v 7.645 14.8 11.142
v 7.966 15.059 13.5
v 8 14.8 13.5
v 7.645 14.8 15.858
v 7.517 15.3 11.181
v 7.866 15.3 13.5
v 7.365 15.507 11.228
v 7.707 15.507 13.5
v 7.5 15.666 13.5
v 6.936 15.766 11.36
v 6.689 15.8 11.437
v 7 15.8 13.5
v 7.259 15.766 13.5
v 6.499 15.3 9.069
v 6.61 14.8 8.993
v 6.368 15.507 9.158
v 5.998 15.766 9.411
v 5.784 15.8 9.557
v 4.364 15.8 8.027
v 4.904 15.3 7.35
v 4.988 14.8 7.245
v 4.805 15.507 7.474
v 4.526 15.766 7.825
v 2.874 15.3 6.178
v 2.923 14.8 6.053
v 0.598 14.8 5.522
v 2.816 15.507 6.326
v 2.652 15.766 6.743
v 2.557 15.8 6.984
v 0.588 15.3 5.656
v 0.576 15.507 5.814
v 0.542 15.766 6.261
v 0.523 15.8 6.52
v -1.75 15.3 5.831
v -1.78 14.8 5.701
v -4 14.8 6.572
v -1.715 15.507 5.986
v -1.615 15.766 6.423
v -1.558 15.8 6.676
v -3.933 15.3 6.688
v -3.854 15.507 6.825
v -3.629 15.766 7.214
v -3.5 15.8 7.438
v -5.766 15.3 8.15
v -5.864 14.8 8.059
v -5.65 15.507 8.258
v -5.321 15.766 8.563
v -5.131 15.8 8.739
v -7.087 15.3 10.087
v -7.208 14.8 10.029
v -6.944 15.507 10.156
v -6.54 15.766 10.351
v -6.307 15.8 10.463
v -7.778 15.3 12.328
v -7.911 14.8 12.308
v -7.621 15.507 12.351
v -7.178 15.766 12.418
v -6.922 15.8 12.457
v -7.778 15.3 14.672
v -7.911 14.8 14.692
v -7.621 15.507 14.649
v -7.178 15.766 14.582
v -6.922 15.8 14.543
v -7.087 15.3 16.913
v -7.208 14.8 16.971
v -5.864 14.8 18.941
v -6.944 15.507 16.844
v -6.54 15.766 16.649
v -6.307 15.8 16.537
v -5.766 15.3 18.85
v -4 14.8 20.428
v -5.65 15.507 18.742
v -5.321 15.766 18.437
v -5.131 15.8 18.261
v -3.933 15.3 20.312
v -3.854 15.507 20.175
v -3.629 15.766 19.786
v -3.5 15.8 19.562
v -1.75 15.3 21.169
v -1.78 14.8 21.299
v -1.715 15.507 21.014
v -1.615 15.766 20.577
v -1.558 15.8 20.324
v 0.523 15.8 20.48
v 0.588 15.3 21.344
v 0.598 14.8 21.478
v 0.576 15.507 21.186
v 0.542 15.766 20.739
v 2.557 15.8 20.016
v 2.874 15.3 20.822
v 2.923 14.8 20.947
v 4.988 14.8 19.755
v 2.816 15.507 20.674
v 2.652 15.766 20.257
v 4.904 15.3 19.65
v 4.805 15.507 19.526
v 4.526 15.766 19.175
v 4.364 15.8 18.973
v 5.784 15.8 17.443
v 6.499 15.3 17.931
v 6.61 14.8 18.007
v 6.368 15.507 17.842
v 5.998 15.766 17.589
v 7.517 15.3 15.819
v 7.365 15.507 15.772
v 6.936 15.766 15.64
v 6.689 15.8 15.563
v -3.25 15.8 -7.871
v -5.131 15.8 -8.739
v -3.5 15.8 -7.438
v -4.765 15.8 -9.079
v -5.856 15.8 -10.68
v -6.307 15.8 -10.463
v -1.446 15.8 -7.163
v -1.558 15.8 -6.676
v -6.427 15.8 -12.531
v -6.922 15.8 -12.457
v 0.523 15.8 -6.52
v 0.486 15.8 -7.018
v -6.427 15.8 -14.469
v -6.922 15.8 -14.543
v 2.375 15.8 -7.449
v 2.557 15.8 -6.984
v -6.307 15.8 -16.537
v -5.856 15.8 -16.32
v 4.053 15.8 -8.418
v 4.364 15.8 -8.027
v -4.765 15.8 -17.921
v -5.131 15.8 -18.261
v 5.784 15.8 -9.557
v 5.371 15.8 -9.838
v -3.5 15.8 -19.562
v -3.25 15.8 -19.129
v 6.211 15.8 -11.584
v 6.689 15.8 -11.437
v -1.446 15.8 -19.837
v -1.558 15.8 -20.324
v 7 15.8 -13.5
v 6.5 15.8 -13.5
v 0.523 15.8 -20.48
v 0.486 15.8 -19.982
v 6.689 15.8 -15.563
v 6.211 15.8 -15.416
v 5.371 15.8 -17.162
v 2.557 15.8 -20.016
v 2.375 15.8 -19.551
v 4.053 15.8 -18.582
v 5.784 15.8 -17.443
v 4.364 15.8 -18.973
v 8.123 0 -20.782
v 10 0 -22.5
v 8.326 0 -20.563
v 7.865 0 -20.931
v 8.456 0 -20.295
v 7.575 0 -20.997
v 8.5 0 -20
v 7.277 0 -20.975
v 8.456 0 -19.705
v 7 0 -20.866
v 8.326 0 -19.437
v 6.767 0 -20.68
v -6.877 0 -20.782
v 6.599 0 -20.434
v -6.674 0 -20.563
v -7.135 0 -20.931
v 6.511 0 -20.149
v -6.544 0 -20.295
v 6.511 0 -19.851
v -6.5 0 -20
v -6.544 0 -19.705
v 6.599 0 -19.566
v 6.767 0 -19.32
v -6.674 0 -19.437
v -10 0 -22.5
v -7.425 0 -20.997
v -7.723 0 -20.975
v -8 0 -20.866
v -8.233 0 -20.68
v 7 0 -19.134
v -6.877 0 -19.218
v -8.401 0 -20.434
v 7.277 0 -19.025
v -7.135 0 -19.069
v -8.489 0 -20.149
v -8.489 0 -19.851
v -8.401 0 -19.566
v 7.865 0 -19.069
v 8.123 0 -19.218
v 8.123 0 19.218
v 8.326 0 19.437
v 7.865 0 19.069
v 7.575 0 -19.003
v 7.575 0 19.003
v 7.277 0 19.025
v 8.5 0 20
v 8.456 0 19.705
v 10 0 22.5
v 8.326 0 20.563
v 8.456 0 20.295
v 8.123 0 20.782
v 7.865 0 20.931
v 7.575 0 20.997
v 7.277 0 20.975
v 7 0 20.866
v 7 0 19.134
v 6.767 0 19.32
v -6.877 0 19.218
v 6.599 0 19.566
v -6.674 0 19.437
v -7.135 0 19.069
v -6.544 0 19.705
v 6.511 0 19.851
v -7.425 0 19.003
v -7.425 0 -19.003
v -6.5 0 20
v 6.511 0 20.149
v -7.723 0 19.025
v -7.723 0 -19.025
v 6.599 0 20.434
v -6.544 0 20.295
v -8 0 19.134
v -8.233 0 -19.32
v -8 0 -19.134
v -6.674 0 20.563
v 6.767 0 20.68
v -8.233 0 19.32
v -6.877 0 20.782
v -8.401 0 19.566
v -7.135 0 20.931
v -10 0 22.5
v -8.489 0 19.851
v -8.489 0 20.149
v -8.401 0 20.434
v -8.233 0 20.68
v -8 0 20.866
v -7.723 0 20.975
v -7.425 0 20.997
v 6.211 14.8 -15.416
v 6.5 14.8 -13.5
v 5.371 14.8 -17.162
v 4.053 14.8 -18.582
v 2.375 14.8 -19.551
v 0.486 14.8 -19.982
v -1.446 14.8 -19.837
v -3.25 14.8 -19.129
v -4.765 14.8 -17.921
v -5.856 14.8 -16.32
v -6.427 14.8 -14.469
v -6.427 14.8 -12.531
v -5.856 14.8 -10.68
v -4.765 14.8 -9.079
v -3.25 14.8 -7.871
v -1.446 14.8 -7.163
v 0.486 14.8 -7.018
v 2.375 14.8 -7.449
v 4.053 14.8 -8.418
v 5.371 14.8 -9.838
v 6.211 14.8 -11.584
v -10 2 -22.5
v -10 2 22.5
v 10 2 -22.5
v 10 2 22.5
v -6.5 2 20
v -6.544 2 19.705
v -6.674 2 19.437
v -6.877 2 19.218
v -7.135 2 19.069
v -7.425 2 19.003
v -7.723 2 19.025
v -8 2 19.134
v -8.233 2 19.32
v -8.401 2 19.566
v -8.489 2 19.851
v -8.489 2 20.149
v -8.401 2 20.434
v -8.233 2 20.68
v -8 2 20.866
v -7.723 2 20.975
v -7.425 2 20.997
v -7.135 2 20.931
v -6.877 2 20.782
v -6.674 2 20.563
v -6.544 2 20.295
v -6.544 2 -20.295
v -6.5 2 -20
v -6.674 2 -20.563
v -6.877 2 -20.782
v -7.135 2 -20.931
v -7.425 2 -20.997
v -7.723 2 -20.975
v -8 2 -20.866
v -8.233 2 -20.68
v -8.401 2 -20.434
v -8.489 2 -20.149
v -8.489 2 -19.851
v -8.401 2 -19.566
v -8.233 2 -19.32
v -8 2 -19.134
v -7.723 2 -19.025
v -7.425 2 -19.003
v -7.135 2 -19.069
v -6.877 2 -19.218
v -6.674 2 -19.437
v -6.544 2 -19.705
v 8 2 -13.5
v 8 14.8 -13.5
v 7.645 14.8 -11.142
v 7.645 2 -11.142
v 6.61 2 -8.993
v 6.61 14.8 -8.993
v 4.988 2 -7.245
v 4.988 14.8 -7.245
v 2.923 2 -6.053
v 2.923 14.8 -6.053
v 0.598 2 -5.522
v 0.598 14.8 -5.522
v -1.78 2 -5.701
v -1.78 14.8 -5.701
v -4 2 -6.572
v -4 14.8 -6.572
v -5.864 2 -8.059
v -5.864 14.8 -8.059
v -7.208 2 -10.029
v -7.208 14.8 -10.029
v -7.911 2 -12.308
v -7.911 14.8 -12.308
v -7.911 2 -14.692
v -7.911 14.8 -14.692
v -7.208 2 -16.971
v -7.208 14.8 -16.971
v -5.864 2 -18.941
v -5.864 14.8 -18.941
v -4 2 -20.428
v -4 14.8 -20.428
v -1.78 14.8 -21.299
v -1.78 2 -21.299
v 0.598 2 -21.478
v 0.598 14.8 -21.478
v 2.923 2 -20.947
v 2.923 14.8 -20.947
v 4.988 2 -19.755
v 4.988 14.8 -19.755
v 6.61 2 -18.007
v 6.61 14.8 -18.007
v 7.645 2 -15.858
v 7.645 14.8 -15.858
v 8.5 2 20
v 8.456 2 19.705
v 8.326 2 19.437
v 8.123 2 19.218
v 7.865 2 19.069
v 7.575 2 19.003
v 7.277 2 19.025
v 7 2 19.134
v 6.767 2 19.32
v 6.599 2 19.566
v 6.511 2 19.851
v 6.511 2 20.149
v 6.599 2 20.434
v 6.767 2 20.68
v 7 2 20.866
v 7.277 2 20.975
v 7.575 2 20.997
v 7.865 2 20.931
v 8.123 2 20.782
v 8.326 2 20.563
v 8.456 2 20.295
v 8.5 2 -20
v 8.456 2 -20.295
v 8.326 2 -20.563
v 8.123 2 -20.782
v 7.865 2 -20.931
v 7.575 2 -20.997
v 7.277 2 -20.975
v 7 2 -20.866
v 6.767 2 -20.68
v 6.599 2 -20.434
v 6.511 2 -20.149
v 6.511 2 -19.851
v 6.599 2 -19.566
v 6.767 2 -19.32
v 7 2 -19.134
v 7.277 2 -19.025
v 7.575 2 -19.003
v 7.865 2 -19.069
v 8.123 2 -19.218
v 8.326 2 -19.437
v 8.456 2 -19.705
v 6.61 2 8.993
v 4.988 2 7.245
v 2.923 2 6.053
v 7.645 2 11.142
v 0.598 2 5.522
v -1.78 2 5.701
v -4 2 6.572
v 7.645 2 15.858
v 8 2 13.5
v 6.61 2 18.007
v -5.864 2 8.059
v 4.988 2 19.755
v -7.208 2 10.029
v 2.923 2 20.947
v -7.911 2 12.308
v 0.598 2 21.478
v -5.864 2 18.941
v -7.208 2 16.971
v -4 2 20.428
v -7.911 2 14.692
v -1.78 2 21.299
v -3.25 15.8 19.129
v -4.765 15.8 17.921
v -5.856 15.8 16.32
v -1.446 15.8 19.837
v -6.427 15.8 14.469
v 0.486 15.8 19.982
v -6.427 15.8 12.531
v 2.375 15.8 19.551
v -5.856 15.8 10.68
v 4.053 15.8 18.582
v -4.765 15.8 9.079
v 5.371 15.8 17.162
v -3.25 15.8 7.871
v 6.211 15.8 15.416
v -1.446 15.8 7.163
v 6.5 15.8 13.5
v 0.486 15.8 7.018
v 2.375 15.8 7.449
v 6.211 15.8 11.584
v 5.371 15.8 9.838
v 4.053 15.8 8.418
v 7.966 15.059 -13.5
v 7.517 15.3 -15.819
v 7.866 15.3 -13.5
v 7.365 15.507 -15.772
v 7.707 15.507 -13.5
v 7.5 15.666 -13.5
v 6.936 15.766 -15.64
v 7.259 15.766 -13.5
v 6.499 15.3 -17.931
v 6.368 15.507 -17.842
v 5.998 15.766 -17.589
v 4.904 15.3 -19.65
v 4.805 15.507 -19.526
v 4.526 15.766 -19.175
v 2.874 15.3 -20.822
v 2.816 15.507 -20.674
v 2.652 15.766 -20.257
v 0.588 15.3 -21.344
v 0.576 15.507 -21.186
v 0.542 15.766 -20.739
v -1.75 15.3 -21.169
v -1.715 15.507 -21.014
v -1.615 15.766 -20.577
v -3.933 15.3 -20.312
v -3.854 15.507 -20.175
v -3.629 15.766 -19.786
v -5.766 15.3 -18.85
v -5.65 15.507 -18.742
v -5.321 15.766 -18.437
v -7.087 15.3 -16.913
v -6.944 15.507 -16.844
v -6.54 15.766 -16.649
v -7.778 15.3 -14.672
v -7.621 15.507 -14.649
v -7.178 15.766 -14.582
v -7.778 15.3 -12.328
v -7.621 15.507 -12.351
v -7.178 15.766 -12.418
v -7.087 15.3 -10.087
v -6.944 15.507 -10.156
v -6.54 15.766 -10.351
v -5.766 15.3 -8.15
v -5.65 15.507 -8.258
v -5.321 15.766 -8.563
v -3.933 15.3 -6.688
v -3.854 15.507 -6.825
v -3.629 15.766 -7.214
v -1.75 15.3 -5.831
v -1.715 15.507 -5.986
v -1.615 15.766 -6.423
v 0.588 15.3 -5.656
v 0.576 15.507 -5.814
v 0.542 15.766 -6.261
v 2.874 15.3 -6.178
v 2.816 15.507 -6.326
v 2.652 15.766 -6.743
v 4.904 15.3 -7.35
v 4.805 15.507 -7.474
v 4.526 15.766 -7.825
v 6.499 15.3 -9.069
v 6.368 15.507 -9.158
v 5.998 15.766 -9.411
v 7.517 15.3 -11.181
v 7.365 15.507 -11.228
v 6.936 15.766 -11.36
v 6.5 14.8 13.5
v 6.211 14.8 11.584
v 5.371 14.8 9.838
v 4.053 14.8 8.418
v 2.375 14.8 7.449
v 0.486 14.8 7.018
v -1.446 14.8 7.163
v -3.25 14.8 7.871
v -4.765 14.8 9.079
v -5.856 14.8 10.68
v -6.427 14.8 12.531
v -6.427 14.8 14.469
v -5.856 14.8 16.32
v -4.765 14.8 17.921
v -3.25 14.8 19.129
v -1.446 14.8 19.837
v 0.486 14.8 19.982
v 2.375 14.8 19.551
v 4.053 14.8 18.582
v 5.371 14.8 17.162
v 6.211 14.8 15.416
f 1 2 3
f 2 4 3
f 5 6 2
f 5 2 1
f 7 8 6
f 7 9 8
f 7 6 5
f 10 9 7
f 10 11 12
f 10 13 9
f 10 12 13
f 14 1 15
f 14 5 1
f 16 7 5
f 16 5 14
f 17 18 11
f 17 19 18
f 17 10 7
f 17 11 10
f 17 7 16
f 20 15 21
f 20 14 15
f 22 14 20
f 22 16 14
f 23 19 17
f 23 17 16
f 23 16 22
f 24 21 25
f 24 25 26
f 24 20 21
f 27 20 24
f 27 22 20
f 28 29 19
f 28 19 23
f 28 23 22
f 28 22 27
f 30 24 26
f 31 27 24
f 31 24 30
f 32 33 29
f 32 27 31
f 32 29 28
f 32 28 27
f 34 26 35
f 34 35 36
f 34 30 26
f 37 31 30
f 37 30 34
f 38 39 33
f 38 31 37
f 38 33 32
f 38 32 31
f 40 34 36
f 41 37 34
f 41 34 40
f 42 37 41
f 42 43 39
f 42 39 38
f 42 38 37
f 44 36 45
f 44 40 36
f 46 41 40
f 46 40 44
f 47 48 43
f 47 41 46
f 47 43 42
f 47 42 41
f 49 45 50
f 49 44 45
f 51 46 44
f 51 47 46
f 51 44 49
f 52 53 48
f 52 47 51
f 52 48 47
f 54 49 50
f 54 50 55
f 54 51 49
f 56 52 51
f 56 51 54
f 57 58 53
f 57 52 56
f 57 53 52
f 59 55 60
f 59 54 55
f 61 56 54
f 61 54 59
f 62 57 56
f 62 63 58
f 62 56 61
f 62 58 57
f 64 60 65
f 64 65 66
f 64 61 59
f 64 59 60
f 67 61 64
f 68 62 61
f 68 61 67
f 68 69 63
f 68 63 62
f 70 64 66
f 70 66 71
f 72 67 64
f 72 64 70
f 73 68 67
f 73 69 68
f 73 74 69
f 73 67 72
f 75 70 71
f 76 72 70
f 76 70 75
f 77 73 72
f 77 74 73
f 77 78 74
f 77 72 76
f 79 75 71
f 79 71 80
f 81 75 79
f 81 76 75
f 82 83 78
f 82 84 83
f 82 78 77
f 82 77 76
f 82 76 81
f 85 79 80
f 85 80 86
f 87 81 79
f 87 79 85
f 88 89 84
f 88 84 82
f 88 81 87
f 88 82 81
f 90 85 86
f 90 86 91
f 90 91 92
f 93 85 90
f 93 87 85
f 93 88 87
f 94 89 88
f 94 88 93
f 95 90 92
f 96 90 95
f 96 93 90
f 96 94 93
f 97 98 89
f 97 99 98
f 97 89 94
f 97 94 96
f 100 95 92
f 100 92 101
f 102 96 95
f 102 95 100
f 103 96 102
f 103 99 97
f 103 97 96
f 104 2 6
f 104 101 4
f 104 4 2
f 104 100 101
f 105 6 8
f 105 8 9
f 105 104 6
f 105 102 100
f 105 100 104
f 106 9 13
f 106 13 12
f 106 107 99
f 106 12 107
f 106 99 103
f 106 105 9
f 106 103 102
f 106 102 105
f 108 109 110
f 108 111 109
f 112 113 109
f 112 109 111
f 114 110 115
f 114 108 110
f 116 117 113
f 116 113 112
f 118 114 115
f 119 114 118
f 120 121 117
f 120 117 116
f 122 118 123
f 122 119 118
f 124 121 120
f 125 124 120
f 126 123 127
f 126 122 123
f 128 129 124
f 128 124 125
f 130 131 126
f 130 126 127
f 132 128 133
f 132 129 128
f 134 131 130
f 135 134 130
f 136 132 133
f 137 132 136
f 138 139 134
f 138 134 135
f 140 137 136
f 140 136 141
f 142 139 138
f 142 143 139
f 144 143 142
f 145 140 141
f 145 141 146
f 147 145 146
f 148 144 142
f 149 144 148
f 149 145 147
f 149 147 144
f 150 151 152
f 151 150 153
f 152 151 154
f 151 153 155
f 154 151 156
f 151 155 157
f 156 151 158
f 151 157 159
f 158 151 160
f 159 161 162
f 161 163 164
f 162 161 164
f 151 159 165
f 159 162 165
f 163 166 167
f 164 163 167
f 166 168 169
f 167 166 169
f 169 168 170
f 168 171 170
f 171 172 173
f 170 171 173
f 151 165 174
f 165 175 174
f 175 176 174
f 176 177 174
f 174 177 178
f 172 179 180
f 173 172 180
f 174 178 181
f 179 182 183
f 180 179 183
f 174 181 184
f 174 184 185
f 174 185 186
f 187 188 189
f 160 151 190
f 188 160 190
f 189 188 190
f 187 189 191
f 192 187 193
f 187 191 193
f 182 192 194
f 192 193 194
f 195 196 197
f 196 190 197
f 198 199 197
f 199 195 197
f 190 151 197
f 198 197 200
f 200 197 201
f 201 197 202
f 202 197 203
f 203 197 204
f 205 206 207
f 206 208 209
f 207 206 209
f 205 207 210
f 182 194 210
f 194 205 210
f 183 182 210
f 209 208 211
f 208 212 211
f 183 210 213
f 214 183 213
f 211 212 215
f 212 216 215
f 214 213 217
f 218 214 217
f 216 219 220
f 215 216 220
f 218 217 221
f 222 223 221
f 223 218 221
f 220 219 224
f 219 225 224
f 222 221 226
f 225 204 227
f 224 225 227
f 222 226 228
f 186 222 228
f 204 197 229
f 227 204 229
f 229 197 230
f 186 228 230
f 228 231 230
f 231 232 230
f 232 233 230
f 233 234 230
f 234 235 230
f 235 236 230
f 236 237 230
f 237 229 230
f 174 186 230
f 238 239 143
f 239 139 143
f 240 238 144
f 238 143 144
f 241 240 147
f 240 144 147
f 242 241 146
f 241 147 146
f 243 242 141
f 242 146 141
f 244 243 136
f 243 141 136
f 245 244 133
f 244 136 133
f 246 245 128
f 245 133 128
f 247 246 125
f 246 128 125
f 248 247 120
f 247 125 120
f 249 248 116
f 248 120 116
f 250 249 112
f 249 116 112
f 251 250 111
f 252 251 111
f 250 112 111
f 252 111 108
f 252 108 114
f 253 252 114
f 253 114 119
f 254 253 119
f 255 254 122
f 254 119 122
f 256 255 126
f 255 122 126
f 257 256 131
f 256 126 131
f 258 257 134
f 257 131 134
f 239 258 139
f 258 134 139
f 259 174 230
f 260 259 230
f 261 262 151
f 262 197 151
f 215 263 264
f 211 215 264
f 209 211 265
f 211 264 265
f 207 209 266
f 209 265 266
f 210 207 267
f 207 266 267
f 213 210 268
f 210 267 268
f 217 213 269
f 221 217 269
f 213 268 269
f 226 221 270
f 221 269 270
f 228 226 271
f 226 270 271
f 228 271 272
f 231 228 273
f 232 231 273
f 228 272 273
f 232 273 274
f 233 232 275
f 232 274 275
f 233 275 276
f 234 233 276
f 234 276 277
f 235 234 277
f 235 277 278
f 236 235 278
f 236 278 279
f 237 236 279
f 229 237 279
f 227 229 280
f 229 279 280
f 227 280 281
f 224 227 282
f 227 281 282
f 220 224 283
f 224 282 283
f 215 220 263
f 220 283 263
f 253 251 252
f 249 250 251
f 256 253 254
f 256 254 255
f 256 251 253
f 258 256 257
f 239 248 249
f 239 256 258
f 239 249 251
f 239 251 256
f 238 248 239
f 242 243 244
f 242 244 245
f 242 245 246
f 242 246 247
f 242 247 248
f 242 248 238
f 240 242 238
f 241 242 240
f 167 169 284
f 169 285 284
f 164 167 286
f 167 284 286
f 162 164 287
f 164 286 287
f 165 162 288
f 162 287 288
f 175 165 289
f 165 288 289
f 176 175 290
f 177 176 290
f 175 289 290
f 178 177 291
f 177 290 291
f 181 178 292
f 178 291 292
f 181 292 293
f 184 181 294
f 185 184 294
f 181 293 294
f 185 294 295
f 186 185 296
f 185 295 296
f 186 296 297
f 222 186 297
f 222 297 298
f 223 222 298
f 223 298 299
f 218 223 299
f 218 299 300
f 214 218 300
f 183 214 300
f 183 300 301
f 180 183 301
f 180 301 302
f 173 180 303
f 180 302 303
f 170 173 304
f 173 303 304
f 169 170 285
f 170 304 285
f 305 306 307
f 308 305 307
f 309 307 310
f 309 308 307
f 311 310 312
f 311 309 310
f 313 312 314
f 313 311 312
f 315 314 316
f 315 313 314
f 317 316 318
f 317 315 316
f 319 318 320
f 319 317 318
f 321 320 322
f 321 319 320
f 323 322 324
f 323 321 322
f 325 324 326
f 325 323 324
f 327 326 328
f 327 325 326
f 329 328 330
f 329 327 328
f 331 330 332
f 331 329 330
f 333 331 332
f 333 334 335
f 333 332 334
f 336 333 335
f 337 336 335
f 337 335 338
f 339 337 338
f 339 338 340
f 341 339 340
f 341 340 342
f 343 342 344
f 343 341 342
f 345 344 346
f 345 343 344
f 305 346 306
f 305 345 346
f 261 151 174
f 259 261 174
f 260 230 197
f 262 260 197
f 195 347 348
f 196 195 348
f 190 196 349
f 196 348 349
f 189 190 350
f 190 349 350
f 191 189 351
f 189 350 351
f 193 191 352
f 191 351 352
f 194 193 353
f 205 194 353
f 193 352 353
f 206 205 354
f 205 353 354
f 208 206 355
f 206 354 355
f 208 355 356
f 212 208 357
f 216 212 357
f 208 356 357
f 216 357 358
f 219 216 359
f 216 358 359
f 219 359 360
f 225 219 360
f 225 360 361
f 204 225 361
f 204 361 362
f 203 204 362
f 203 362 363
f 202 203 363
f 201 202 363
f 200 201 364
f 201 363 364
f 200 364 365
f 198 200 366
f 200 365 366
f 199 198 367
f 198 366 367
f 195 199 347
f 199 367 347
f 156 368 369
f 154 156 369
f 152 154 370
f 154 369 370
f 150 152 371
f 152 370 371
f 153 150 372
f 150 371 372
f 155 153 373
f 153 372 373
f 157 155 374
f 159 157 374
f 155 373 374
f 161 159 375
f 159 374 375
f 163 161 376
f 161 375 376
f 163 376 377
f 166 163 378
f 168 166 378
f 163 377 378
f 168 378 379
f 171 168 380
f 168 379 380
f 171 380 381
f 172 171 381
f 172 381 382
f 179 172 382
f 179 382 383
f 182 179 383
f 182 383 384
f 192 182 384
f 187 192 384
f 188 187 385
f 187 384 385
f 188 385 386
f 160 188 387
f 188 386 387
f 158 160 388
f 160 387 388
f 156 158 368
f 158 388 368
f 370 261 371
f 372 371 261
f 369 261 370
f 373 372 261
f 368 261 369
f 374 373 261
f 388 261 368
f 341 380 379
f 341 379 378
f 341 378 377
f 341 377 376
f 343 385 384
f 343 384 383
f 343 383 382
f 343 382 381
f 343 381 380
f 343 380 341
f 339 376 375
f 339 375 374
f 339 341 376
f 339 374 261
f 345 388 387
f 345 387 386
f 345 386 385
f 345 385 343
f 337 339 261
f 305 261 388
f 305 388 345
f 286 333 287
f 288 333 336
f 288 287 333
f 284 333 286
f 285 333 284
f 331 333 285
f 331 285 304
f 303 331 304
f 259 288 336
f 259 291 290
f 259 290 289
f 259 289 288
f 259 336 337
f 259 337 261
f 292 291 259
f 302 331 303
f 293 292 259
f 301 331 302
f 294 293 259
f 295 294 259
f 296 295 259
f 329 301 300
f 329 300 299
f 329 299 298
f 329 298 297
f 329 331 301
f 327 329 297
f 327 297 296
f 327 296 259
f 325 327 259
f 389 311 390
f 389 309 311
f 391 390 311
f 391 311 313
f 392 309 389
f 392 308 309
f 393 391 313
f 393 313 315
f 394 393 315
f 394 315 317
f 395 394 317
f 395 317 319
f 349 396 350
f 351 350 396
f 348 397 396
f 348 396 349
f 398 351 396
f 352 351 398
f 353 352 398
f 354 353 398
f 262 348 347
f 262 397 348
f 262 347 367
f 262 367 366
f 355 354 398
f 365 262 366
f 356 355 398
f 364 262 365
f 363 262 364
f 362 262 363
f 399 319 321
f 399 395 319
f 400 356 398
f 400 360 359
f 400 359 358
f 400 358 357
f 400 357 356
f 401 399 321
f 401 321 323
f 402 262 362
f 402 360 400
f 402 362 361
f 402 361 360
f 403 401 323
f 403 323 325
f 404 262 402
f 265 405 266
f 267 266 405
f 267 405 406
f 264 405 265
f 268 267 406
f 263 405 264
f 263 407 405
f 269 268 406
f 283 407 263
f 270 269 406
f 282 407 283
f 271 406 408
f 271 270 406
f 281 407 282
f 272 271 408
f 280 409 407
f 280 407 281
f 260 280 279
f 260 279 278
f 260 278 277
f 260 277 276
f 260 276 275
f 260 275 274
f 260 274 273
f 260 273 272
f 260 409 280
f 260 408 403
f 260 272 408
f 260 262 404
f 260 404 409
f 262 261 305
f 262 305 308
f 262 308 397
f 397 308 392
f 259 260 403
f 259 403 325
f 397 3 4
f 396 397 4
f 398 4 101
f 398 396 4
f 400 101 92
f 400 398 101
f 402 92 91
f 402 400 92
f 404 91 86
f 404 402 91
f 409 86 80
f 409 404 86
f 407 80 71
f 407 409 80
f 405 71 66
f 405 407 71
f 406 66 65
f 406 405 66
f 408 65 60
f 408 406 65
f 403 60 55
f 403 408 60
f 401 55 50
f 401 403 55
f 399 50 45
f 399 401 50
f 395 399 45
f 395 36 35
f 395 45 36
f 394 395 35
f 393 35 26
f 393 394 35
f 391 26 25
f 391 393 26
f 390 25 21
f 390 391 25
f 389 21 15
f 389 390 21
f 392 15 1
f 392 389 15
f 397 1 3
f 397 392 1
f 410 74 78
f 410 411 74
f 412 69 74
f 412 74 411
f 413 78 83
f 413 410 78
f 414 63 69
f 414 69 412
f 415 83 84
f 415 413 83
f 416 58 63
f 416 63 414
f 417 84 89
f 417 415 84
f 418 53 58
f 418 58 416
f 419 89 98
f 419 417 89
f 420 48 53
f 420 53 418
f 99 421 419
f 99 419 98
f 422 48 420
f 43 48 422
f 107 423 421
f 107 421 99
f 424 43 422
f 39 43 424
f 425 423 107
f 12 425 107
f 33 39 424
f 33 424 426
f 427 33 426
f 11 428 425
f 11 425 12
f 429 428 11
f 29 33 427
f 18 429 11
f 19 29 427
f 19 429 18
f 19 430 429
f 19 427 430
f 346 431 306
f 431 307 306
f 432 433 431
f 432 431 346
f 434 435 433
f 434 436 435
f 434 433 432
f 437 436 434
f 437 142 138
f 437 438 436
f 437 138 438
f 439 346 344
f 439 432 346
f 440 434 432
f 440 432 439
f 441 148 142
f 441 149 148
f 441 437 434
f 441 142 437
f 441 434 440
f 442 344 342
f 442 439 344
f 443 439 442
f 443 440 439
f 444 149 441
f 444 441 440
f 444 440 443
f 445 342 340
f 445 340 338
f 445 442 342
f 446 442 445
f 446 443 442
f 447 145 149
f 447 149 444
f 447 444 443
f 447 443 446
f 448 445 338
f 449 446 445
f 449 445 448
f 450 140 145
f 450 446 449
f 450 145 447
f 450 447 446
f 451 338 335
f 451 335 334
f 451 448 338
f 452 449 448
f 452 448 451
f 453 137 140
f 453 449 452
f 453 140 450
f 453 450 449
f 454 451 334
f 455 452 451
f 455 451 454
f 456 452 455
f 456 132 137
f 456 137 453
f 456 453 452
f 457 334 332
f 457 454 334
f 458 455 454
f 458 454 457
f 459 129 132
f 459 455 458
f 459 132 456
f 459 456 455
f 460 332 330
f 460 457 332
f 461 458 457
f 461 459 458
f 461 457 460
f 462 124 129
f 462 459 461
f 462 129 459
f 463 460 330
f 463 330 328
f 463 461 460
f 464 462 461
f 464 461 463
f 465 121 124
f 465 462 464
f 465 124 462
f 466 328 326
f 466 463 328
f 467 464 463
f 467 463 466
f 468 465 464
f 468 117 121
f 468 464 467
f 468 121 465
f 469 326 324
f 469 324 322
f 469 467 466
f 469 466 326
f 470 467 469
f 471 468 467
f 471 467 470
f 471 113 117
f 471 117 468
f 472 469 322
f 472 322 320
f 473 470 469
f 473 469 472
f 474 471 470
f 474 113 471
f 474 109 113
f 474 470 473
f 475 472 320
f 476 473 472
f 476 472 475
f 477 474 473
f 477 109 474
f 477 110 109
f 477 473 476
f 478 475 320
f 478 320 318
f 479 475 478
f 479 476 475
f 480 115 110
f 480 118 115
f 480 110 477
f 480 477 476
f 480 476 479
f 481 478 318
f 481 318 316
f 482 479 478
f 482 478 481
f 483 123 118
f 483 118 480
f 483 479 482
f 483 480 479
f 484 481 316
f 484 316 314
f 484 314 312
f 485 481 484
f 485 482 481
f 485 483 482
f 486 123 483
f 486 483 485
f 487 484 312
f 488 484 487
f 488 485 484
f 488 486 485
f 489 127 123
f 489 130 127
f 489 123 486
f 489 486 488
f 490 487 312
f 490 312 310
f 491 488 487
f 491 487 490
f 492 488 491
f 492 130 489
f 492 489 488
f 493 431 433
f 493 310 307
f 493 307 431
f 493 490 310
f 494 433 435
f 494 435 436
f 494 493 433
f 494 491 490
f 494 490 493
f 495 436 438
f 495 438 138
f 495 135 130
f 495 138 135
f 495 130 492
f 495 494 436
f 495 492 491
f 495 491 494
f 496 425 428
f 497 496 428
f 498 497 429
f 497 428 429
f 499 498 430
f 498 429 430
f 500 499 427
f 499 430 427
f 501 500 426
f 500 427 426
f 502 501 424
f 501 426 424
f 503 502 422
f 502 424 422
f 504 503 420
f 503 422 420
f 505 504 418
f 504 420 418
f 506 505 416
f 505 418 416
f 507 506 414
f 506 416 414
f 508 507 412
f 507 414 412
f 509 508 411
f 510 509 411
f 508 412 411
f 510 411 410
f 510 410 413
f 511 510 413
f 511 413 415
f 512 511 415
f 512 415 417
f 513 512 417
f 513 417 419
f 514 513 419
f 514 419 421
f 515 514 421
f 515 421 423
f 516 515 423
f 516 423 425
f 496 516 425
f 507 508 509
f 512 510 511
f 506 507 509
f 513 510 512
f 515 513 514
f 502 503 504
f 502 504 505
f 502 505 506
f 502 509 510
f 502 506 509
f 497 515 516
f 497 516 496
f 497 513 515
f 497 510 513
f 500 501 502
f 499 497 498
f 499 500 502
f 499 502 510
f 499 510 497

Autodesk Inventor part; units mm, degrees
ref_plane "YZ Plane" through (0, 0, 0) normal (1, 0, 0) x (0, 1, 0)
ref_plane "XZ Plane" through (0, 0, 0) normal (0, 1, 0) x (-1, 0, 0)
ref_plane "XY Plane" through (0, 0, 0) normal (0, 0, 1) x (1, 0, 0)
sketch "Sketch1" plane through (0, 0, 0) normal (0, 1, 0) x (-1, 0, 0)
  line L0 (-10, 22.5) -> (-10, -22.5)
  line L1 (-10, -22.5) -> (10, -22.5)
  line L2 (10, -22.5) -> (10, 22.5)
  line L3 (10, 22.5) -> (-10, 22.5)
  line L4 (-10, 22.5) -> (10, -22.5) construction
  line L5 (-10, -22.5) -> (10, 22.5) construction
  point P0 (0, 0)
  dimension "d0" = 45
  dimension "d1" = 20
extrude "Extrusion1" add sketch "Sketch1" along normal blind 2
sketch "Sketch2" plane through (0, 2, 0) normal (0, 1, 0) x (1, 0, 0)
  line L0 (7.5, -20) -> (7.5, 20)
  line L1 (7.5, 20) -> (-7.5, 20)
  line L2 (-7.5, 20) -> (-7.5, -20)
  line L3 (-7.5, -20) -> (7.5, -20)
  line L4 (7.5, -20) -> (-7.5, 20) construction
  line L5 (7.5, 20) -> (-7.5, -20) construction
  circle A0 centre (-7.5, -20) radius 1
  circle A1 centre (7.5, -20) radius 1
  circle A2 centre (7.5, 20) radius 1
  circle A3 centre (-7.5, 20) radius 1
  point P0 (0, 0)
  dimension "d25" = 40
  dimension "d26" = 15
  dimension "d27" = 2
  dimension "d28" = 2
  dimension "d29" = 2
  dimension "d30" = 2
extrude "Extrusion2" cut sketch "Sketch2" against normal blind 2 contours L3 A1 L0 | L0 A1 L3 | A2 L1 L0 | L0 L1 A2 | A0 L2 L3 | L3 L2 A0 | A3 L2 L1 | L1 L2 A3
sketch "Sketch3" plane through (0, 2, 0) normal (0, 1, 0) x (1, 0, 0)
  circle A0 centre (0, -13.5) radius 8
  circle A1 centre (0, 13.5) radius 8
  dimension "d33" = 16
  dimension "d34" = 16
extrude "Extrusion3" add sketch "Sketch3" along normal blind 13.8
fillet "Fillet1" radius 1 2 edges at (-8, 15.8, -13.5) (-8, 15.8, 13.5)
sketch "Sketch4" plane through (0, 15.8, 13.5) normal (0, 1, 0) x (1, 0, 0)
  circle A0 centre (0, 0) radius 8 projected
  circle A1 centre (0, 27) radius 8 projected
  circle A2 centre (0, 0) radius 6.5
  circle A3 centre (0, 27) radius 6.5
  dimension "d35" = 13
  dimension "d36" = 13
extrude "Extrusion4" cut sketch "Sketch4" against normal blind 1 contours A2 | A3
properties part number "HC-SR04 Sonar"
